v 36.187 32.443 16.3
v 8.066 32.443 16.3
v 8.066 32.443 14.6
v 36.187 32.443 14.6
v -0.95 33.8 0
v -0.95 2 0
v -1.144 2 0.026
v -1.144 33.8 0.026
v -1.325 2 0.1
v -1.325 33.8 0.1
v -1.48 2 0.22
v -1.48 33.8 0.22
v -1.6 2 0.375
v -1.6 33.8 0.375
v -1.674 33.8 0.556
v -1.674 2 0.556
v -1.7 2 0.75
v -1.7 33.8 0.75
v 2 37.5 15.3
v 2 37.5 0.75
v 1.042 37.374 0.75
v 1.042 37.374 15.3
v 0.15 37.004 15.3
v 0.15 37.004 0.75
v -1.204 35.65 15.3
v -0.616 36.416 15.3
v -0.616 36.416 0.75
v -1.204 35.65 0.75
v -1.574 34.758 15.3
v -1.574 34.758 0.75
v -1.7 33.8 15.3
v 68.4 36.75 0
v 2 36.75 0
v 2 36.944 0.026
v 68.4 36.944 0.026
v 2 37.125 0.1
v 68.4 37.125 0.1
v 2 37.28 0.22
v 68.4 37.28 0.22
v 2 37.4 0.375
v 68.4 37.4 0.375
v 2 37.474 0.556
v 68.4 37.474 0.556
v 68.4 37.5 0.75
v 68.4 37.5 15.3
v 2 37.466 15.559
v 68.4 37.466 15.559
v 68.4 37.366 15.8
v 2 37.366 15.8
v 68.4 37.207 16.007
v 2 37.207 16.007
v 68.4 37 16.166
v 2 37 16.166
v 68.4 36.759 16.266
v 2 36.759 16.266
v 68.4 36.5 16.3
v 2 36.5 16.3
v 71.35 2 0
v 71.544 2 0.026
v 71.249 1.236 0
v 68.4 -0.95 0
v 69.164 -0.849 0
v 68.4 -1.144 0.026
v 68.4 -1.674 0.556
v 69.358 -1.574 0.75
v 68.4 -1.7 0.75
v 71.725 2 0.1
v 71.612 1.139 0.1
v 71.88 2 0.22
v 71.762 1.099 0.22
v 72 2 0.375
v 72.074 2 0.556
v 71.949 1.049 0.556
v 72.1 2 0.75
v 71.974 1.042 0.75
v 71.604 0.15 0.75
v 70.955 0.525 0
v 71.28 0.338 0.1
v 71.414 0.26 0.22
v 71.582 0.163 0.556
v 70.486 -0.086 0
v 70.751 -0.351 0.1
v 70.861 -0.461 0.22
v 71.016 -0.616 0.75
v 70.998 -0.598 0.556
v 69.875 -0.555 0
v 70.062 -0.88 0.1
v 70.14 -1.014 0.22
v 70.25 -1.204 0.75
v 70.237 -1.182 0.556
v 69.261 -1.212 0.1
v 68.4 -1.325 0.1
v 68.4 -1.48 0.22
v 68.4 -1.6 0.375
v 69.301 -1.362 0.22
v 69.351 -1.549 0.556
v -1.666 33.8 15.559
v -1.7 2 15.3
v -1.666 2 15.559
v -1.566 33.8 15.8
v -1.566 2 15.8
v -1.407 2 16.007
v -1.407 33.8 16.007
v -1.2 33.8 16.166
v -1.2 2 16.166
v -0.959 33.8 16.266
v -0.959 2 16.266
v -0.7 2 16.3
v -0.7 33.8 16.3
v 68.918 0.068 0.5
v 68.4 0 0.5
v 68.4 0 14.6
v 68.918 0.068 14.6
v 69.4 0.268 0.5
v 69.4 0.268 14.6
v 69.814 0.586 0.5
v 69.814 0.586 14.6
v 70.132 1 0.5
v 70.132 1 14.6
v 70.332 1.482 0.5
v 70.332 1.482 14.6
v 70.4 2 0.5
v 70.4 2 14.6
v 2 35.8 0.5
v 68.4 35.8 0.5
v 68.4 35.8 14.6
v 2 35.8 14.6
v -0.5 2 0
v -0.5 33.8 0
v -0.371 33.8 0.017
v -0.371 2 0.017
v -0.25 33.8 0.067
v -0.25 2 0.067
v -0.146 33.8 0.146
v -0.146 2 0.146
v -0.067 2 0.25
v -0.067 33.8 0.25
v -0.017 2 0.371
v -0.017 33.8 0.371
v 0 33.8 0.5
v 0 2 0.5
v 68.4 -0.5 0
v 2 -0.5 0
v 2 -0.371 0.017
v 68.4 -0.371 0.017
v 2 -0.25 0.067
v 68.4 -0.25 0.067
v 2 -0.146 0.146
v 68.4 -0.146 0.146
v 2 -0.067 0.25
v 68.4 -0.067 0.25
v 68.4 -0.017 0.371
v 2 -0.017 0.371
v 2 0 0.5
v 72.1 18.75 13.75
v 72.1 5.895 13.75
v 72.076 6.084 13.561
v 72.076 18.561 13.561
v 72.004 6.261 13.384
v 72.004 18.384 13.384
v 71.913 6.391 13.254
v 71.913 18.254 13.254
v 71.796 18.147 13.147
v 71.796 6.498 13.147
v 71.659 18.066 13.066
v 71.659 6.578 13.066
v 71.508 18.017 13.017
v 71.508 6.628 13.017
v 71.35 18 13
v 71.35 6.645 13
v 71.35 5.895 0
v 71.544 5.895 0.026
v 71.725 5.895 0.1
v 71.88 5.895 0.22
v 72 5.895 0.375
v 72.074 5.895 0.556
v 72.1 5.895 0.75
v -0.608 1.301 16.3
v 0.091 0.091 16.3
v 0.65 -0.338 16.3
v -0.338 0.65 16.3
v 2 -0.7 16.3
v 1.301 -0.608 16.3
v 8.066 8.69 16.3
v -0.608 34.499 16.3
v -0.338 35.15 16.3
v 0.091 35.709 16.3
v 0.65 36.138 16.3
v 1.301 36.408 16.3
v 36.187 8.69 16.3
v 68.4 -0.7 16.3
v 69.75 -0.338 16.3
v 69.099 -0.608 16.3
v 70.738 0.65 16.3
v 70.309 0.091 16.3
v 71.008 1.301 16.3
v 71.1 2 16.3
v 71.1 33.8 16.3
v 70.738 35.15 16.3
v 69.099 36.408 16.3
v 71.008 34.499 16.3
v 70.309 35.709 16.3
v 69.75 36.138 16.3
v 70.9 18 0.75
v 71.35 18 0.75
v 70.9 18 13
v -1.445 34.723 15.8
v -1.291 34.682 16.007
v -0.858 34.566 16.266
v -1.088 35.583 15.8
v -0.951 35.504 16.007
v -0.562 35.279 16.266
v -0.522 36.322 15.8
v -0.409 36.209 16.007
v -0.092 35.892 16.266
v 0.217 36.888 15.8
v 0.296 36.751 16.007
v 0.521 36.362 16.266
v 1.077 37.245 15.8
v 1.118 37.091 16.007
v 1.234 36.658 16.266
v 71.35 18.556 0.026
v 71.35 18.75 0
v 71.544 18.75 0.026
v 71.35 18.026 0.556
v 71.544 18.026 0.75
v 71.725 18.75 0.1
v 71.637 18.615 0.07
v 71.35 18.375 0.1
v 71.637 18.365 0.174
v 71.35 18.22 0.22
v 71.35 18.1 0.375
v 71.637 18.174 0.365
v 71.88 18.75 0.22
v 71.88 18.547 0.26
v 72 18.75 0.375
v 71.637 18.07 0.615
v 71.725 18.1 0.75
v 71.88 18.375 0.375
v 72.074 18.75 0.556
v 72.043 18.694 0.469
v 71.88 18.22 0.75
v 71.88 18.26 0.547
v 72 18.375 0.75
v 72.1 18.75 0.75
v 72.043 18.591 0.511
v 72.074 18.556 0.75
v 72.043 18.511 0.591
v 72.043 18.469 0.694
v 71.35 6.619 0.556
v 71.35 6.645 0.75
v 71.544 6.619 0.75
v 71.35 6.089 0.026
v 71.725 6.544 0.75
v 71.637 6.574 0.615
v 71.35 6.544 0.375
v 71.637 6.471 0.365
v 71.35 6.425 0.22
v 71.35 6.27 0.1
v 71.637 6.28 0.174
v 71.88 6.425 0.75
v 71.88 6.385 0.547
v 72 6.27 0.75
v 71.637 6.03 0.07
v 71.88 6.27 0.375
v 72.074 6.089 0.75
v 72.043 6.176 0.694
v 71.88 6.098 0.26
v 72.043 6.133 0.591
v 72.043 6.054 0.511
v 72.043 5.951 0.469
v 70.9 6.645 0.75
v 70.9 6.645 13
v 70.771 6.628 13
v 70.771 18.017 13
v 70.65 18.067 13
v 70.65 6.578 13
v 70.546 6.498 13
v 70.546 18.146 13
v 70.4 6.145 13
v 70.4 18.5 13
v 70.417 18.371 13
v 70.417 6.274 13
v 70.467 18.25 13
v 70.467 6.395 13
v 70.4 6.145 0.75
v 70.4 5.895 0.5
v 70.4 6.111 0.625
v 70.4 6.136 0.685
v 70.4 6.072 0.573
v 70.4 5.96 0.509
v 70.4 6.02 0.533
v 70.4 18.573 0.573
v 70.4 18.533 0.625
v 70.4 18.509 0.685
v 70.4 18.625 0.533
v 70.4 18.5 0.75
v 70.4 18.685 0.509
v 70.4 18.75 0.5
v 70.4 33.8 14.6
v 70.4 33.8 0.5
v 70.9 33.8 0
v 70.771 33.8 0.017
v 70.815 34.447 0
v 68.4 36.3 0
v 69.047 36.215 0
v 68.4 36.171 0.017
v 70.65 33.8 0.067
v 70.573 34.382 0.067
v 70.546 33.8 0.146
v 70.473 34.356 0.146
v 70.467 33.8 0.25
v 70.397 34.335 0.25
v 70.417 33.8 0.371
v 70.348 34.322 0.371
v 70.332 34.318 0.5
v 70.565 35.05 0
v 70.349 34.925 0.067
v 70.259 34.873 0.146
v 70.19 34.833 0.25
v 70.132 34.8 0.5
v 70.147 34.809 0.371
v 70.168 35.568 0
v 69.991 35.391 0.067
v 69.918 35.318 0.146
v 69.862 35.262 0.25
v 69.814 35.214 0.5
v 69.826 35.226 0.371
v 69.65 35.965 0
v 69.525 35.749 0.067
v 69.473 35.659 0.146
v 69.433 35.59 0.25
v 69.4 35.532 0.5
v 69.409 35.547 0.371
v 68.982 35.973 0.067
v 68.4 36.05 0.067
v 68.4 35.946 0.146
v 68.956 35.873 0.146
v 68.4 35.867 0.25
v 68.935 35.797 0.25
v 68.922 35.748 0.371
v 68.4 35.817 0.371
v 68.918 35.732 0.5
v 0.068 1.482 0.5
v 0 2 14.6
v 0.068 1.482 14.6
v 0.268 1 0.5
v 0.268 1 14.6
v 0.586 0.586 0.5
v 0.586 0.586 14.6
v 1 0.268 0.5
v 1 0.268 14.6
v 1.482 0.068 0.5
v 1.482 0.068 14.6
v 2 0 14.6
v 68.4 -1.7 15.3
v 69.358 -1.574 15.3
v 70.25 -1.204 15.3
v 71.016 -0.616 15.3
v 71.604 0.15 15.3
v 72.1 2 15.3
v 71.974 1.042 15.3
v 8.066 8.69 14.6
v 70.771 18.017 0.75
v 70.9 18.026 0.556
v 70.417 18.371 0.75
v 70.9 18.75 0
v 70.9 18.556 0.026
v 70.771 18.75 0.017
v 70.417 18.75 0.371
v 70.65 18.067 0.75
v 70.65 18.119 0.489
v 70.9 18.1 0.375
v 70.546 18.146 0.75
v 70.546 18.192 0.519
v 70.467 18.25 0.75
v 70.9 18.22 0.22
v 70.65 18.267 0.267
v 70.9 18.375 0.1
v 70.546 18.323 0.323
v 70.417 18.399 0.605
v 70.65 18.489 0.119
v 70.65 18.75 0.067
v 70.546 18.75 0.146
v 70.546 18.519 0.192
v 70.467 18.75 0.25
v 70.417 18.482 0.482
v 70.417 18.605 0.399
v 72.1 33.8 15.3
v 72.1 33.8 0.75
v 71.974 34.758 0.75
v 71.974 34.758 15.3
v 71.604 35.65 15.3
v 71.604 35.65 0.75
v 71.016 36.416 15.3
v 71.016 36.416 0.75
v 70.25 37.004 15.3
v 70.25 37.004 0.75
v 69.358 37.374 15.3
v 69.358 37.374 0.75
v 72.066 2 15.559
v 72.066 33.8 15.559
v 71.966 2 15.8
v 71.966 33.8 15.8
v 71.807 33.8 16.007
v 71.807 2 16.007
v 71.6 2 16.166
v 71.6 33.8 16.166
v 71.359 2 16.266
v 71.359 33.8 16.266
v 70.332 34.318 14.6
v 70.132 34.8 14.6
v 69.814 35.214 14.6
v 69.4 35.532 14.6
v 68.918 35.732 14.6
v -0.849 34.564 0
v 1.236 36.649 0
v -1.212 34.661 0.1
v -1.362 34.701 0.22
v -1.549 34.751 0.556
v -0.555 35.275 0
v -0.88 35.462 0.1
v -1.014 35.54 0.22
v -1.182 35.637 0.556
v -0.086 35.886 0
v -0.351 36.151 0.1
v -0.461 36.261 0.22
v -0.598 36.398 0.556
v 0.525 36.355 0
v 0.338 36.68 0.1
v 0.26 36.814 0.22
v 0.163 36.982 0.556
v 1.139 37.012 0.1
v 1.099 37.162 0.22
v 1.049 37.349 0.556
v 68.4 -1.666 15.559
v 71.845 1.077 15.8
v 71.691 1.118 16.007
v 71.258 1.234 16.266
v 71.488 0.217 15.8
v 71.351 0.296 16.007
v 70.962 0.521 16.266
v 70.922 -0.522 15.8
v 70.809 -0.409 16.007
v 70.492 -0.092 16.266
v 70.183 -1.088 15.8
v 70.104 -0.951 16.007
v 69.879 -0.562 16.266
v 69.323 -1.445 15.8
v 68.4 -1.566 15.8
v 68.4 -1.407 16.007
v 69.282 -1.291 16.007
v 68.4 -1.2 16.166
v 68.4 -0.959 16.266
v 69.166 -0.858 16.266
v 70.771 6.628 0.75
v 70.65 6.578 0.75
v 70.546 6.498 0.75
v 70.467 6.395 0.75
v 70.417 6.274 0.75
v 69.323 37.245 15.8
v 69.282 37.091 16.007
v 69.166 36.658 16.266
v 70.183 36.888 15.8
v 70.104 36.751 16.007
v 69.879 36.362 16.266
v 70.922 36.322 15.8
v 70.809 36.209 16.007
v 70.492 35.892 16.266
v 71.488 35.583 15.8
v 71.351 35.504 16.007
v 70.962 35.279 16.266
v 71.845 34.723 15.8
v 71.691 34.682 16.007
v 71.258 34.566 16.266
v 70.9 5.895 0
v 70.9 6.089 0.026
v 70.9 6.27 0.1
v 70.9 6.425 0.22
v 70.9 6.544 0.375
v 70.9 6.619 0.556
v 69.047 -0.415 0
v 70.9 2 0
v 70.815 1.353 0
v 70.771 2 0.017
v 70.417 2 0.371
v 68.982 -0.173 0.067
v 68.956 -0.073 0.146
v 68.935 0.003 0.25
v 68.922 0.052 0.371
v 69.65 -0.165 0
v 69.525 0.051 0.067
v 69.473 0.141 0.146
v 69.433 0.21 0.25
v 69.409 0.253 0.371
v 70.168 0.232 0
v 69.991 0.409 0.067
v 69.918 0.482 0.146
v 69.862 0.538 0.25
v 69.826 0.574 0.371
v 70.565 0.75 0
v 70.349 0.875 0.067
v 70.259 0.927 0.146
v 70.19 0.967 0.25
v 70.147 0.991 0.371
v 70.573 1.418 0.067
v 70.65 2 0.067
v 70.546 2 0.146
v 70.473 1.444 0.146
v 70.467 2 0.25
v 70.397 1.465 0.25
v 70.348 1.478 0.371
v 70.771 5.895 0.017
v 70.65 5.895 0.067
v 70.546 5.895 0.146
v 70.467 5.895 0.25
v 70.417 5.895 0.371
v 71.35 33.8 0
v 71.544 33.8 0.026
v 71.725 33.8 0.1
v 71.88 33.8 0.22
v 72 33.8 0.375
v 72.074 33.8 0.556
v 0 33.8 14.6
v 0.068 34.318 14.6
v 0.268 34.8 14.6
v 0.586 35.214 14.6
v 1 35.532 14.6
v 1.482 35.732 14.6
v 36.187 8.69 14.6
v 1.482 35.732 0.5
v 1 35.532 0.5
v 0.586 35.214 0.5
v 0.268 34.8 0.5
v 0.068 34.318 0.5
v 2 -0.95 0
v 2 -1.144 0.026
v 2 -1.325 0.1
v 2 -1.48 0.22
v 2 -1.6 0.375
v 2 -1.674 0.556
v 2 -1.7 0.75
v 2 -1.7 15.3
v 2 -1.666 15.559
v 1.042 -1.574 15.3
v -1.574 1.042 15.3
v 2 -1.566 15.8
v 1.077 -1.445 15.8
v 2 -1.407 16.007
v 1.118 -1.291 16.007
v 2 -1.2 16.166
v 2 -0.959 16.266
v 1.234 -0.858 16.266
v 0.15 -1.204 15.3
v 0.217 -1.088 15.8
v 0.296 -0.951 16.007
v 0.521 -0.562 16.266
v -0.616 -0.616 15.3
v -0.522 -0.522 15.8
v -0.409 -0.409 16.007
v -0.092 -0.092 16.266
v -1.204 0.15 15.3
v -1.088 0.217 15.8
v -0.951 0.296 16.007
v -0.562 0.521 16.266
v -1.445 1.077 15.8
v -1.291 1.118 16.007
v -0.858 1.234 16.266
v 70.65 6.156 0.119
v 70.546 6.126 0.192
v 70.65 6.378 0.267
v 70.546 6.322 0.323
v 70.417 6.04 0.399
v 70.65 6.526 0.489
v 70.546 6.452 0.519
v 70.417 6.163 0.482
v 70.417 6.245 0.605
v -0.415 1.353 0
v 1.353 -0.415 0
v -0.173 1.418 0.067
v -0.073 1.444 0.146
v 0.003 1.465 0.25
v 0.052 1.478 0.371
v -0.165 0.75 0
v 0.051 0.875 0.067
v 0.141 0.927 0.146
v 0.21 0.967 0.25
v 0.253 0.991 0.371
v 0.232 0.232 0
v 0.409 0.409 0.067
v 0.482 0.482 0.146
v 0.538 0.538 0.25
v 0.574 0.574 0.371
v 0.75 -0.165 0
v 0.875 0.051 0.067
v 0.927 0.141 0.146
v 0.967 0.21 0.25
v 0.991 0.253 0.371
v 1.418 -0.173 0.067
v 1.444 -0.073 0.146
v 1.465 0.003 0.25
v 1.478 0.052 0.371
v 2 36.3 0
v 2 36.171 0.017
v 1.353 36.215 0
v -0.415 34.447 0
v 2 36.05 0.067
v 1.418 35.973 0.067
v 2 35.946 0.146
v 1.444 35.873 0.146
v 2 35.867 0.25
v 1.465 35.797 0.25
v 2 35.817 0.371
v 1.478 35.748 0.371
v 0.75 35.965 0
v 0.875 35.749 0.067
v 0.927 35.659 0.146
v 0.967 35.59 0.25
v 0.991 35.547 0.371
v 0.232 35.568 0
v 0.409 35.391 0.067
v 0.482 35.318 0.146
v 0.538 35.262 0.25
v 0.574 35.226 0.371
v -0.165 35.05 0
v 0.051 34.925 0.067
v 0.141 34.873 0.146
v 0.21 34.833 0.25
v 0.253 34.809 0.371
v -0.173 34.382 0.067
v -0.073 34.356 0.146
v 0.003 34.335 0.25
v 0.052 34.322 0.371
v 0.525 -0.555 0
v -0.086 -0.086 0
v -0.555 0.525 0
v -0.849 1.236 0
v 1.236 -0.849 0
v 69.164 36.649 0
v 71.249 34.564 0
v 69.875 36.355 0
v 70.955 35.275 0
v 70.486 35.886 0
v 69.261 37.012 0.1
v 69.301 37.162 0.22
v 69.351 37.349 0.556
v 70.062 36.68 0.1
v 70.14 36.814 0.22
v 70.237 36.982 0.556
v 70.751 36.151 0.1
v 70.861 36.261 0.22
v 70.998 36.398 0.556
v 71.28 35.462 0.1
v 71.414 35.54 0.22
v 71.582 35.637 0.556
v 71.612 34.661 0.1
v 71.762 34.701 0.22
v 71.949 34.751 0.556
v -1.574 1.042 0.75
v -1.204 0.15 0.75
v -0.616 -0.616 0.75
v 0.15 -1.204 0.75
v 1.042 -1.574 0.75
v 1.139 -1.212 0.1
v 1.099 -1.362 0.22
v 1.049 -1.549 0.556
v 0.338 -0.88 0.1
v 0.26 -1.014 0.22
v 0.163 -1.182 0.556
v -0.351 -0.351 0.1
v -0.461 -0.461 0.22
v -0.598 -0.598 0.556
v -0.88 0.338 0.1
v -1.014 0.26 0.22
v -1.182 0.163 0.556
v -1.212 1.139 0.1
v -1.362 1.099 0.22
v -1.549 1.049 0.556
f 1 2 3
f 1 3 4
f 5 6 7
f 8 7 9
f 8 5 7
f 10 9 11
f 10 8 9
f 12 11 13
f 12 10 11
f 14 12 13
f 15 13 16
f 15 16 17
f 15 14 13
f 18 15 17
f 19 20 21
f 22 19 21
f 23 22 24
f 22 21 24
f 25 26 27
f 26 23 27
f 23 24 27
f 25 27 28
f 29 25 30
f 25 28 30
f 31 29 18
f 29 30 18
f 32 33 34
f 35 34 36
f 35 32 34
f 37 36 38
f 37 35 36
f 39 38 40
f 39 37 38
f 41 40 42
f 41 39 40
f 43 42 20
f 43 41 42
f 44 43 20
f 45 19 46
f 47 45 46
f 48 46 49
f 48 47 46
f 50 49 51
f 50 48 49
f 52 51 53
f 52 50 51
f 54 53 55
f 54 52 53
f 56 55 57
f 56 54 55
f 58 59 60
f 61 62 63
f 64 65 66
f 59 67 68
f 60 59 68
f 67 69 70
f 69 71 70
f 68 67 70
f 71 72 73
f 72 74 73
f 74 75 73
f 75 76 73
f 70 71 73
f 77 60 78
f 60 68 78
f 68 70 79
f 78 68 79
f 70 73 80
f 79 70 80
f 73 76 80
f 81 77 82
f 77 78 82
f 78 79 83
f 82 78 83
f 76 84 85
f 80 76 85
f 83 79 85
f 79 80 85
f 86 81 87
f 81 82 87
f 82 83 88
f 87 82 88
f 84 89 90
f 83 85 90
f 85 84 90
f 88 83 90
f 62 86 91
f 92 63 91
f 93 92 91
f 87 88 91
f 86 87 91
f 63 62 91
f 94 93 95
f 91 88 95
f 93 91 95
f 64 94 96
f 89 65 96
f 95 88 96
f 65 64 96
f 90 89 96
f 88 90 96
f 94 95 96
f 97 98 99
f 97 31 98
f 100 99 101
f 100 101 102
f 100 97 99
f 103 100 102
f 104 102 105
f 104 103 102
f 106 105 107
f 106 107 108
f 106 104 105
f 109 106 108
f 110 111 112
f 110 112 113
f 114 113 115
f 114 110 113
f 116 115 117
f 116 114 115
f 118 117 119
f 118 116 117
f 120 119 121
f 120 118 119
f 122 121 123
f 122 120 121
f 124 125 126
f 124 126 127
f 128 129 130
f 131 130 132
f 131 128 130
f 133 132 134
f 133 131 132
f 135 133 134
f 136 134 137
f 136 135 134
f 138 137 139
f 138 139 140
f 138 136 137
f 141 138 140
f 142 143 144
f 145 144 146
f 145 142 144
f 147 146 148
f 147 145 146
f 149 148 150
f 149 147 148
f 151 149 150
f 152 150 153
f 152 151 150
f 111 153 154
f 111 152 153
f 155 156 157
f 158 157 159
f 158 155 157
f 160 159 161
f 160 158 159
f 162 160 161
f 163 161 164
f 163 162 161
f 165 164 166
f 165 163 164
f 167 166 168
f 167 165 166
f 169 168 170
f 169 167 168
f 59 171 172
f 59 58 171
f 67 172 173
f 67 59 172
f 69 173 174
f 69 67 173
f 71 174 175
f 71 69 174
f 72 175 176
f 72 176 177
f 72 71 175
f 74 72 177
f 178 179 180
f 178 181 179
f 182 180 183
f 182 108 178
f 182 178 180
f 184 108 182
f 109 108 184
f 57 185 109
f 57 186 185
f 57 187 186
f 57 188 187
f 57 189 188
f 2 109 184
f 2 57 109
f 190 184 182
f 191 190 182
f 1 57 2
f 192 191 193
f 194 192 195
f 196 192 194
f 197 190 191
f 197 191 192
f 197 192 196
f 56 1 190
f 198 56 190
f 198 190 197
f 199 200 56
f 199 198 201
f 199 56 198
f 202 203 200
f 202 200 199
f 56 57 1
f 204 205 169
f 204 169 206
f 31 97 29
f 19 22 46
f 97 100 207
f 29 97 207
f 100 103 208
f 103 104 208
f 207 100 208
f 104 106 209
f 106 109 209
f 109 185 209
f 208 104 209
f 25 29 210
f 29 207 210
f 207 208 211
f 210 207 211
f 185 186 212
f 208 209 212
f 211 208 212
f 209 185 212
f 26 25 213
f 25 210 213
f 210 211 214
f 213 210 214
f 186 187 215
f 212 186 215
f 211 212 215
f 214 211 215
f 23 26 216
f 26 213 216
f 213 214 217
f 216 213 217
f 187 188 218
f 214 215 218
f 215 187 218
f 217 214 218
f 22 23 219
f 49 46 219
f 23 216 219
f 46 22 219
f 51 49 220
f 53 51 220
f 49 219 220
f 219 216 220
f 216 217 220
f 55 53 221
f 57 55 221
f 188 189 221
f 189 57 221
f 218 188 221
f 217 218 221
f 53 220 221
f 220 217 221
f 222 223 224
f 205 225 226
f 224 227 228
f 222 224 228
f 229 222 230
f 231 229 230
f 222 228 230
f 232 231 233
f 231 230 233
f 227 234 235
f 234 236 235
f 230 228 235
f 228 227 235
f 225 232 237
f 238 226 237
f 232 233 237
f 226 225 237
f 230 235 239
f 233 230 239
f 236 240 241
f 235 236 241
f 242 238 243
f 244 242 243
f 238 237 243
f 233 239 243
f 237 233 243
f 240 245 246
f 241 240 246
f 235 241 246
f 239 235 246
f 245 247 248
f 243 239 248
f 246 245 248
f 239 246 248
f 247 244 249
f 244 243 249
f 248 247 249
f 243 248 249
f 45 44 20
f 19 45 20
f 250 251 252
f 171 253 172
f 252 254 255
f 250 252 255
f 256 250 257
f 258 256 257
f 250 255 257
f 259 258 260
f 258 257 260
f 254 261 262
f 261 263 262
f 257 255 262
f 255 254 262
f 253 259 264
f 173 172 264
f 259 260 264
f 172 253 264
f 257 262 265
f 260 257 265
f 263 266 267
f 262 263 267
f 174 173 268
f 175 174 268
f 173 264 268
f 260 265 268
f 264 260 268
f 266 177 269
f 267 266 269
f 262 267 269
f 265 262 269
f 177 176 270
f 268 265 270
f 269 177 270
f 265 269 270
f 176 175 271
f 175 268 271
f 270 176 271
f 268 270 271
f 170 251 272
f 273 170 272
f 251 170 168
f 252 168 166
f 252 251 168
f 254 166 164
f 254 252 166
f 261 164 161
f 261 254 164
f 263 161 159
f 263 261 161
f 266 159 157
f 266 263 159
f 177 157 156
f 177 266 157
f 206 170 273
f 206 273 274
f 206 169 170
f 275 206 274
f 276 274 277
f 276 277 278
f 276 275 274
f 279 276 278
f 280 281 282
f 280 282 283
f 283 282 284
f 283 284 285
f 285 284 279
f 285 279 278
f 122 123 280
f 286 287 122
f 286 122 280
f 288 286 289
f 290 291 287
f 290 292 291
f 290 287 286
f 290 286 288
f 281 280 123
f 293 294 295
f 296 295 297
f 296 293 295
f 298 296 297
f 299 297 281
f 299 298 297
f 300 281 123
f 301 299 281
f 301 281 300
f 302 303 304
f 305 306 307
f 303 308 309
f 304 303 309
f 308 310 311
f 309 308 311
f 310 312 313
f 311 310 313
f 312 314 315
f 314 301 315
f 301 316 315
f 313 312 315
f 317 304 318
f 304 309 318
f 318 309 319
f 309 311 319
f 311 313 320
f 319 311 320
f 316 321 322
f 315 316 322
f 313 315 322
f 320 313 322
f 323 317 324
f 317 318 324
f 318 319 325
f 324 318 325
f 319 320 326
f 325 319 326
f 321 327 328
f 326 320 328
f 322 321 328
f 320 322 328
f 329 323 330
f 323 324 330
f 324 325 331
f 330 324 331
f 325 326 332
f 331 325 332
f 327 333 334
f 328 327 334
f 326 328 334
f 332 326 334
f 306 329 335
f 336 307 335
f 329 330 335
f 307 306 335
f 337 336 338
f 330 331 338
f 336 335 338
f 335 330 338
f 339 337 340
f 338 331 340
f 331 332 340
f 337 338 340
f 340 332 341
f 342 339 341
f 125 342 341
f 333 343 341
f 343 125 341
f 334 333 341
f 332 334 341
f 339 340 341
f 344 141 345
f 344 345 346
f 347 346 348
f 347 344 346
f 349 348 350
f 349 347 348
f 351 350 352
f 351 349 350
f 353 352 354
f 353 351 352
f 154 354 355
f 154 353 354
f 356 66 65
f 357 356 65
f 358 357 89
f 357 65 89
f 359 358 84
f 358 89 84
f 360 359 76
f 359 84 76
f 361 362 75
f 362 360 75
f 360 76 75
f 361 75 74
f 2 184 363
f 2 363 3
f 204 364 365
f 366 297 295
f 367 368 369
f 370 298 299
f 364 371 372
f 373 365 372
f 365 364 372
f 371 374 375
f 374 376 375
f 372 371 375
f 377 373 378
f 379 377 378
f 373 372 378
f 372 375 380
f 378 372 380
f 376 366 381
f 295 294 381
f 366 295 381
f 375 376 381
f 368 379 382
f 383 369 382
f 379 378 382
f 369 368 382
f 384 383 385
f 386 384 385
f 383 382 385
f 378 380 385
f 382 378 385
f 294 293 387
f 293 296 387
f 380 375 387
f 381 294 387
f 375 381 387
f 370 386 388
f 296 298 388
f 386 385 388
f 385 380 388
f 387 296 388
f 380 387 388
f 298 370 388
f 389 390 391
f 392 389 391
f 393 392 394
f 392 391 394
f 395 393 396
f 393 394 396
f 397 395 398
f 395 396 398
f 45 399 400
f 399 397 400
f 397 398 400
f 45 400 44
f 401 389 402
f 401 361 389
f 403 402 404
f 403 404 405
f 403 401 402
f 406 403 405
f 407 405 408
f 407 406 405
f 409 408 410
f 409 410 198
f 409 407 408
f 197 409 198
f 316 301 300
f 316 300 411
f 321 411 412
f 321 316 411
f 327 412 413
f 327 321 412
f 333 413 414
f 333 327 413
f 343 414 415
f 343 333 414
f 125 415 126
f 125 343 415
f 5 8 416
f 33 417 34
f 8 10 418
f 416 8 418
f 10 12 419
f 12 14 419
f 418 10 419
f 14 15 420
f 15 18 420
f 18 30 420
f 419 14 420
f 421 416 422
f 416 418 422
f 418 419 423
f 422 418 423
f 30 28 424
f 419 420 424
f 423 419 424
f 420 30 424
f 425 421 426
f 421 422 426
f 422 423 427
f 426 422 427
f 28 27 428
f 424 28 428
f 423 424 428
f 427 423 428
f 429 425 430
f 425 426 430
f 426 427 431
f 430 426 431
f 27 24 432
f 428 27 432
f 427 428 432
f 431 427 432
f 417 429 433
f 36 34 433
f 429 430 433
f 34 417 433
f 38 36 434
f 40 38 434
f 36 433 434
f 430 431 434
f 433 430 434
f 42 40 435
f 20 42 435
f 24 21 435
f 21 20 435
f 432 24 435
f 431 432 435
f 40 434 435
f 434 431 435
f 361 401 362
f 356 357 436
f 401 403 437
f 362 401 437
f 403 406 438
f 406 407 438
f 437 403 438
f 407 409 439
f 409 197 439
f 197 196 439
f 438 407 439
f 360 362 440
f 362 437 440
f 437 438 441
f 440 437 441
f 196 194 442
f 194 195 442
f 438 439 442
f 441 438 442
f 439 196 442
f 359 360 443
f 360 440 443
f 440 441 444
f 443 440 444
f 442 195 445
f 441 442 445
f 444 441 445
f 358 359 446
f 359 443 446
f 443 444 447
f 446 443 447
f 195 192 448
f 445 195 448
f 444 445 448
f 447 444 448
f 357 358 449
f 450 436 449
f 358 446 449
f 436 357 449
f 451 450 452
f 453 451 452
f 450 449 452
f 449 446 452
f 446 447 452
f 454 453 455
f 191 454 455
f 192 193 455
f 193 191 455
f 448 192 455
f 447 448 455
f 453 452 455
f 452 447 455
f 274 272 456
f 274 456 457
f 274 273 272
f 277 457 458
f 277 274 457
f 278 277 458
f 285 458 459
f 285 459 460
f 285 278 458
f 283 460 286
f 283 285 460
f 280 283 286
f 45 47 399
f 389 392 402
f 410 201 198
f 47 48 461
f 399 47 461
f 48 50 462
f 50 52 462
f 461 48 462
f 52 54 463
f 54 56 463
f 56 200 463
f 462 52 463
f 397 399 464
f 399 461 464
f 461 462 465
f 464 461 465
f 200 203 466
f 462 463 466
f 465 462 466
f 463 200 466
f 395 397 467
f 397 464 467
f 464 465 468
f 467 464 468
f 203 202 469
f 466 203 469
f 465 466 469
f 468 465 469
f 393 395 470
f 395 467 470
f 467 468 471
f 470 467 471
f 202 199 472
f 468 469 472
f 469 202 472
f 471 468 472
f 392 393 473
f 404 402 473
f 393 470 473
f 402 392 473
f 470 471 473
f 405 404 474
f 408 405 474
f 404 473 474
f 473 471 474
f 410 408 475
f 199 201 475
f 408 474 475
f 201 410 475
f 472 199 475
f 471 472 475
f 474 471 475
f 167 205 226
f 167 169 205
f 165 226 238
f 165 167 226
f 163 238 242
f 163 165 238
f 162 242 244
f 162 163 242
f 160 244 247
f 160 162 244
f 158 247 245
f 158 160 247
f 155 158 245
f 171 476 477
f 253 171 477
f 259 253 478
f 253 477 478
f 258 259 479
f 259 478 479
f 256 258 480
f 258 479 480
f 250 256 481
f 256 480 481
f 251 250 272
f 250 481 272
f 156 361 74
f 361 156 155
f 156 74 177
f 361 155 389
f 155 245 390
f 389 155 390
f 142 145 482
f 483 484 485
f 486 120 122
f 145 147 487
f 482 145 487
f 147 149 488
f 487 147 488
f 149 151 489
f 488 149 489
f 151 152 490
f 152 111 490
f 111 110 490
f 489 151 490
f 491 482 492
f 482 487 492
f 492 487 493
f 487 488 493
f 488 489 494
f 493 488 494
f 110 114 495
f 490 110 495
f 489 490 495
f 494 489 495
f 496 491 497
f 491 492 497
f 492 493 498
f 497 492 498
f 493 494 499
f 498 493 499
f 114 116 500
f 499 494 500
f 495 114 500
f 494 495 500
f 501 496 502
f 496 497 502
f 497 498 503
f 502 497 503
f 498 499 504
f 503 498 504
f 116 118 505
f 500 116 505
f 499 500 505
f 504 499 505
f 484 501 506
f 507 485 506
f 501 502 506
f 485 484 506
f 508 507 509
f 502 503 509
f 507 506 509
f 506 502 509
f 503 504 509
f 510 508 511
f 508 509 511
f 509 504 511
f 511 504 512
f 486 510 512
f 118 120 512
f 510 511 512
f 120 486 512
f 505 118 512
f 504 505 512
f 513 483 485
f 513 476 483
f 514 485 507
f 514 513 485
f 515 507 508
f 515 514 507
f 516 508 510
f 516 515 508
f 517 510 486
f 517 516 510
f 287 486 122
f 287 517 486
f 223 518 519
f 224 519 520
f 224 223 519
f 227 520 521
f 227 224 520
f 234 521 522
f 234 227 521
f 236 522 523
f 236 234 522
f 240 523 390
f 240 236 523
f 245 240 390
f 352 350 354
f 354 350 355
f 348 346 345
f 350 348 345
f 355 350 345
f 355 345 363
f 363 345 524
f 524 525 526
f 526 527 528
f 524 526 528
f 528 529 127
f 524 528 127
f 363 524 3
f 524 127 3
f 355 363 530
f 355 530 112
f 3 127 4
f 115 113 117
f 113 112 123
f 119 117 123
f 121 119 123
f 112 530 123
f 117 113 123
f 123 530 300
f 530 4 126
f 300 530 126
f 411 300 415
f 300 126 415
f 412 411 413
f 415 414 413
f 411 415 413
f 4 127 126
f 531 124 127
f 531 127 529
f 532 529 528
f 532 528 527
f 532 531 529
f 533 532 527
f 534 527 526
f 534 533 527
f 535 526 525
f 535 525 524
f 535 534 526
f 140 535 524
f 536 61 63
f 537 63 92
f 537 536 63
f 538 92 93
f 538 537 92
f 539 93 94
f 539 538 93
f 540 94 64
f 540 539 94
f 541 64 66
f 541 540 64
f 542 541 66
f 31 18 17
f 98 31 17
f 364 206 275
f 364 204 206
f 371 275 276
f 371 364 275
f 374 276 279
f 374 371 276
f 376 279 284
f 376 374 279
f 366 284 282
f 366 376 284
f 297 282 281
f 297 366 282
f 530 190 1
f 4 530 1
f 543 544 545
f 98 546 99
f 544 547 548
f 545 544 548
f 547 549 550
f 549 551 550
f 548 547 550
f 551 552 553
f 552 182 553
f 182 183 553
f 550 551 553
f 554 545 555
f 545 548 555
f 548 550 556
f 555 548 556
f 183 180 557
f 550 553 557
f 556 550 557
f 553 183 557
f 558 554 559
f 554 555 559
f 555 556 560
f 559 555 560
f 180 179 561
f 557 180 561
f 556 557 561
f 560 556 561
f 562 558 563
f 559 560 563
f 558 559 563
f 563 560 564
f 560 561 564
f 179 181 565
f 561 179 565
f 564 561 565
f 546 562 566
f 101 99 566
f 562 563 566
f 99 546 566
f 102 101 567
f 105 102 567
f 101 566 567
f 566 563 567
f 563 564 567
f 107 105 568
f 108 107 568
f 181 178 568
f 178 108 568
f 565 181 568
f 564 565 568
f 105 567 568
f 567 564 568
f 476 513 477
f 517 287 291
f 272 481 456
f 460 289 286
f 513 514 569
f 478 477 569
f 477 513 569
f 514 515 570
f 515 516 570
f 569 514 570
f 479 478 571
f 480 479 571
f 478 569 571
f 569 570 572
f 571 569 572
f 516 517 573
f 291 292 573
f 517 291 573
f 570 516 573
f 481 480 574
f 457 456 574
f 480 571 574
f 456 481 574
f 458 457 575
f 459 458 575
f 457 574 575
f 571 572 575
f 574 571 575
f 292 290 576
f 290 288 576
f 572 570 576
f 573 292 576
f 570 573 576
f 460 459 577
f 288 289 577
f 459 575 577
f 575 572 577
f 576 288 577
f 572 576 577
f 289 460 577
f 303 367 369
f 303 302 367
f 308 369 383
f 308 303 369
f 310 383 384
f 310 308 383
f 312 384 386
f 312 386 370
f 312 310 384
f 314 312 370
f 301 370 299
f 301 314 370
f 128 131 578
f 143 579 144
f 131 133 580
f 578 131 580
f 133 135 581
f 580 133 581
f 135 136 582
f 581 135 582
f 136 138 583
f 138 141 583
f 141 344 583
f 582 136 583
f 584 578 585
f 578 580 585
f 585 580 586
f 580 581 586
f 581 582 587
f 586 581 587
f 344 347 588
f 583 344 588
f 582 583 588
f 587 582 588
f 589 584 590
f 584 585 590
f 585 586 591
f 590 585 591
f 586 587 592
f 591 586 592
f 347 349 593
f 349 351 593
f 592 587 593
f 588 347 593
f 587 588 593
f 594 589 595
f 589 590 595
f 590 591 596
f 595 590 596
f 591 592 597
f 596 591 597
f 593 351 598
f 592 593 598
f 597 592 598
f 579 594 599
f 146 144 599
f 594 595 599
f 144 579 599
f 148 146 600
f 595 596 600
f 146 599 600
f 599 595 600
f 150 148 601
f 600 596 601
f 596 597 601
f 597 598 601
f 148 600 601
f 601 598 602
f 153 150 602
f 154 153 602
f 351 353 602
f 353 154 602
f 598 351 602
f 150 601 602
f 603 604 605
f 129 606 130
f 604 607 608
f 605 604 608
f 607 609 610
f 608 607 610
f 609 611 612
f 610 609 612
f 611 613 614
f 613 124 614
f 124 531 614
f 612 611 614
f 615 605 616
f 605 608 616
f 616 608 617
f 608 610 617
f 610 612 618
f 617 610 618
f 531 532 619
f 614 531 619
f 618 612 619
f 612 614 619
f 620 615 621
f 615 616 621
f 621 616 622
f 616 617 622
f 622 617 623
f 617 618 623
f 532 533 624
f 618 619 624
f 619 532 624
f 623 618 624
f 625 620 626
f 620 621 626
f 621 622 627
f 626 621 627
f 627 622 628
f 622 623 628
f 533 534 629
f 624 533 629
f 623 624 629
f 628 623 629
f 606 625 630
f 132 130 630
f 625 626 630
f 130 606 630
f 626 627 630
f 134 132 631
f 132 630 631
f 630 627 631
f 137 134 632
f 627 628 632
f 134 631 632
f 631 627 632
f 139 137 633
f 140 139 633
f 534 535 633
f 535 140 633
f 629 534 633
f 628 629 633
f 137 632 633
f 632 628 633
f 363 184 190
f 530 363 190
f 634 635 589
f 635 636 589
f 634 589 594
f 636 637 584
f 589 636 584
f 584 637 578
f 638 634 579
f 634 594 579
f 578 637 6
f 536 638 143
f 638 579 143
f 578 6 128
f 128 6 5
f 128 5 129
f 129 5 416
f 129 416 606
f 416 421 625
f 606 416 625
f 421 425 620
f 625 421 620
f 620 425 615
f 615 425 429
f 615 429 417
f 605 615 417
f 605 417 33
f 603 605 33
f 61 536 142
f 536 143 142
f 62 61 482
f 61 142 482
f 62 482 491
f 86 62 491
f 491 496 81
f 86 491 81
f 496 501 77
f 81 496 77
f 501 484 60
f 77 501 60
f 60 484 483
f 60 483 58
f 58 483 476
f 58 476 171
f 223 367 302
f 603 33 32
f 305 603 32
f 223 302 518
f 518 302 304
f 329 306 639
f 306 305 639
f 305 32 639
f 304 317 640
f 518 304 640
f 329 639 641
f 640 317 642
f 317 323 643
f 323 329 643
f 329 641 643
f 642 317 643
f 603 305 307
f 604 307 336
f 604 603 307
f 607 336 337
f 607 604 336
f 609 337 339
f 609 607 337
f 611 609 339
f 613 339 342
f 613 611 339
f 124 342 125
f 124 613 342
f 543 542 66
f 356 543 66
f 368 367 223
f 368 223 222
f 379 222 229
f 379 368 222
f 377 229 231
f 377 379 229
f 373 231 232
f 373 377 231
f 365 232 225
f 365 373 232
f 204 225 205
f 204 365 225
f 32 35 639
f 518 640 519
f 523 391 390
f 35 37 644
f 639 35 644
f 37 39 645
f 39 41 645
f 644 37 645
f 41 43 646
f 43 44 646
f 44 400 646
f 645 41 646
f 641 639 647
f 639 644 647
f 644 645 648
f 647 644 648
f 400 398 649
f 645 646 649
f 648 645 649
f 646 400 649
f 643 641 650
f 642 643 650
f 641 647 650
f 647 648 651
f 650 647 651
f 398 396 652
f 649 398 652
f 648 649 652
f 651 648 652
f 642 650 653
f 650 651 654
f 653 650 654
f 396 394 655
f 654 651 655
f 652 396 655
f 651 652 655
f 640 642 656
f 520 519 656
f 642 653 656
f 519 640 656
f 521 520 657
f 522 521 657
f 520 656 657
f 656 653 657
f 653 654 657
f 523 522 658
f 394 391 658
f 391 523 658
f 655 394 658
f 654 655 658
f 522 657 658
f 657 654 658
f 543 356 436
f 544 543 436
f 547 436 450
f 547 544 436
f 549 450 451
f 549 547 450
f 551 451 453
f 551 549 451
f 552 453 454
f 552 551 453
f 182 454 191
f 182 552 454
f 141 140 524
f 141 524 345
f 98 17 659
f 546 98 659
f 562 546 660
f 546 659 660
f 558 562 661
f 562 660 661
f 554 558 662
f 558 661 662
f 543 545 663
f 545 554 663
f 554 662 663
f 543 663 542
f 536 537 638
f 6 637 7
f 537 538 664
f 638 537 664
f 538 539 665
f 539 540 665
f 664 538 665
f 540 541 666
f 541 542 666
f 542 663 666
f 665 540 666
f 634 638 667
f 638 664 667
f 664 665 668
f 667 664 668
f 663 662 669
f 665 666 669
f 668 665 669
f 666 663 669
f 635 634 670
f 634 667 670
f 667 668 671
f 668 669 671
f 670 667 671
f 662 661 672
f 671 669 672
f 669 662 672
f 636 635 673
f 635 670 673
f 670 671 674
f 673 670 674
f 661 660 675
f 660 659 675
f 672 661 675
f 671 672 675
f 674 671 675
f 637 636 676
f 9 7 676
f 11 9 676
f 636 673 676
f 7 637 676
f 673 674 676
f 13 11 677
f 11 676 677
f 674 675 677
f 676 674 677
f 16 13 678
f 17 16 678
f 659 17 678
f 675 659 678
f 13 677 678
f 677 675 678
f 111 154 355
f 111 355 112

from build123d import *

# Parameters (mm, degrees)
BOSS_EXTRU_1_DEPTH      = 14.6
COQUE1_T                = 1.7
ESQUISSE7_W             = 1.7
ESQUISSE7_H             = 11.355170452
ENL_V_MAT_EXTRU_2_DEPTH = 13
CONG_2_R                = 0.75
ESQUISSE9_W             = 28.120859144
ESQUISSE9_H             = 23.752570345
ENL_V_MAT_EXTRU_3_DEPTH = 3
CONG_4_R                = 1
CONG_5_R                = 0.75
CONG_6_R                = 0.5


with BuildPart() as part:
    # Esquisse1 → Boss.-Extru.1 (new body)
    with BuildSketch(Plane.XY):
        with BuildLine():
            Line((2, 0), (68.4, 0))
            ThreePointArc((68.4, 0), (69.814213562, 0.585786438), (70.4, 2))
            Line((70.4, 2), (70.4, 33.8))
            ThreePointArc((70.4, 33.8), (69.814213562, 35.214213562), (68.4, 35.8))
            Line((68.4, 35.8), (2, 35.8))
            ThreePointArc((2, 35.8), (0.585786438, 35.214213562), (0, 33.8))
            Line((0, 33.8), (0, 2))
            ThreePointArc((0, 2), (0.585786438, 0.585786438), (2, 0))
        make_face()
    extrude(amount=BOSS_EXTRU_1_DEPTH)

    # Coque1
    coque1_openings = [part.faces().sort_by_distance(p)[0] for p in [
        (35.2, 17.9, 0),
    ]]
    offset(amount=COQUE1_T, openings=coque1_openings, kind=Kind.INTERSECTION)

    # Esquisse7 → Enlèv. mat.-Extru.2 (cut)
    with BuildSketch(Plane(origin=(0, 0, 0), x_dir=(-1, 0, 0), z_dir=(0, 0, -1))):
        with Locations((-71.25, 12.322414774)):
            Rectangle(ESQUISSE7_W, ESQUISSE7_H)
    extrude(amount=-ENL_V_MAT_EXTRU_2_DEPTH, mode=Mode.SUBTRACT)

    # Congé2
    cong_2_edges = [part.edges().sort_by_distance(p)[0] for p in [
        (71.25, 6.644829548, 0),
        (71.25, 18, 0),
    ]]
    fillet(cong_2_edges, radius=CONG_2_R)

    # Esquisse9 → Enlèv. mat.-Extru.3 (cut)
    with BuildSketch(Plane.XY.offset(16.3)):
        with Locations((22.126551481, 20.566590434)):
            Rectangle(ESQUISSE9_W, ESQUISSE9_H)
    extrude(amount=-ENL_V_MAT_EXTRU_3_DEPTH, mode=Mode.SUBTRACT)

    # Congé4
    cong_4_edges = [part.edges().sort_by_distance(p)[0] for p in [
        (-0.61629509, -0.61629509, 16.3),
        (35.2, -1.7, 16.3),
        (71.01629509, -0.61629509, 16.3),
        (72.1, 17.9, 16.3),
        (71.01629509, 36.41629509, 16.3),
        (35.2, 37.5, 16.3),
        (-0.61629509, 36.41629509, 16.3),
        (-1.7, 17.9, 16.3),
    ]]
    fillet(cong_4_edges, radius=CONG_4_R)

    # Congé5
    cong_5_edges = [part.edges().sort_by_distance(p)[0] for p in [
        (-1.7, 17.9, 0),
        (-0.61629509, 36.41629509, 0),
        (72.1, 12.322414774, 13),
        (72.1, 6.644829548, 6.875),
        (72.1, 18, 6.875),
        (72.1, 26.275, 0),
        (72.1, 18.219669914, 0.219669914),
        (72.1, 6.425159634, 0.219669914),
        (35.2, 37.5, 0),
        (71.01629509, 36.41629509, 0),
        (72.1, 3.947414774, 0),
        (71.01629509, -0.61629509, 0),
        (35.2, -1.7, 0),
        (-0.61629509, -0.61629509, 0),
    ]]
    fillet(cong_5_edges, radius=CONG_5_R)

    # Congé6
    cong_6_edges = [part.edges().sort_by_distance(p)[0] for p in [
        (0.585786438, 35.214213562, 0),
        (0, 17.9, 0),
        (0.585786438, 0.585786438, 0),
        (35.2, 0, 0),
        (69.814213562, 0.585786438, 0),
        (70.4, 3.947414774, 0),
        (69.814213562, 35.214213562, 0),
        (35.2, 35.8, 0),
        (70.4, 18, 6.875),
        (70.4, 6.644829548, 6.875),
        (70.4, 26.275, 0),
        (70.4, 18.219669914, 0.219669914),
        (70.4, 6.425159634, 0.219669914),
    ]]
    fillet(cong_6_edges, radius=CONG_6_R)


solid = part.part
